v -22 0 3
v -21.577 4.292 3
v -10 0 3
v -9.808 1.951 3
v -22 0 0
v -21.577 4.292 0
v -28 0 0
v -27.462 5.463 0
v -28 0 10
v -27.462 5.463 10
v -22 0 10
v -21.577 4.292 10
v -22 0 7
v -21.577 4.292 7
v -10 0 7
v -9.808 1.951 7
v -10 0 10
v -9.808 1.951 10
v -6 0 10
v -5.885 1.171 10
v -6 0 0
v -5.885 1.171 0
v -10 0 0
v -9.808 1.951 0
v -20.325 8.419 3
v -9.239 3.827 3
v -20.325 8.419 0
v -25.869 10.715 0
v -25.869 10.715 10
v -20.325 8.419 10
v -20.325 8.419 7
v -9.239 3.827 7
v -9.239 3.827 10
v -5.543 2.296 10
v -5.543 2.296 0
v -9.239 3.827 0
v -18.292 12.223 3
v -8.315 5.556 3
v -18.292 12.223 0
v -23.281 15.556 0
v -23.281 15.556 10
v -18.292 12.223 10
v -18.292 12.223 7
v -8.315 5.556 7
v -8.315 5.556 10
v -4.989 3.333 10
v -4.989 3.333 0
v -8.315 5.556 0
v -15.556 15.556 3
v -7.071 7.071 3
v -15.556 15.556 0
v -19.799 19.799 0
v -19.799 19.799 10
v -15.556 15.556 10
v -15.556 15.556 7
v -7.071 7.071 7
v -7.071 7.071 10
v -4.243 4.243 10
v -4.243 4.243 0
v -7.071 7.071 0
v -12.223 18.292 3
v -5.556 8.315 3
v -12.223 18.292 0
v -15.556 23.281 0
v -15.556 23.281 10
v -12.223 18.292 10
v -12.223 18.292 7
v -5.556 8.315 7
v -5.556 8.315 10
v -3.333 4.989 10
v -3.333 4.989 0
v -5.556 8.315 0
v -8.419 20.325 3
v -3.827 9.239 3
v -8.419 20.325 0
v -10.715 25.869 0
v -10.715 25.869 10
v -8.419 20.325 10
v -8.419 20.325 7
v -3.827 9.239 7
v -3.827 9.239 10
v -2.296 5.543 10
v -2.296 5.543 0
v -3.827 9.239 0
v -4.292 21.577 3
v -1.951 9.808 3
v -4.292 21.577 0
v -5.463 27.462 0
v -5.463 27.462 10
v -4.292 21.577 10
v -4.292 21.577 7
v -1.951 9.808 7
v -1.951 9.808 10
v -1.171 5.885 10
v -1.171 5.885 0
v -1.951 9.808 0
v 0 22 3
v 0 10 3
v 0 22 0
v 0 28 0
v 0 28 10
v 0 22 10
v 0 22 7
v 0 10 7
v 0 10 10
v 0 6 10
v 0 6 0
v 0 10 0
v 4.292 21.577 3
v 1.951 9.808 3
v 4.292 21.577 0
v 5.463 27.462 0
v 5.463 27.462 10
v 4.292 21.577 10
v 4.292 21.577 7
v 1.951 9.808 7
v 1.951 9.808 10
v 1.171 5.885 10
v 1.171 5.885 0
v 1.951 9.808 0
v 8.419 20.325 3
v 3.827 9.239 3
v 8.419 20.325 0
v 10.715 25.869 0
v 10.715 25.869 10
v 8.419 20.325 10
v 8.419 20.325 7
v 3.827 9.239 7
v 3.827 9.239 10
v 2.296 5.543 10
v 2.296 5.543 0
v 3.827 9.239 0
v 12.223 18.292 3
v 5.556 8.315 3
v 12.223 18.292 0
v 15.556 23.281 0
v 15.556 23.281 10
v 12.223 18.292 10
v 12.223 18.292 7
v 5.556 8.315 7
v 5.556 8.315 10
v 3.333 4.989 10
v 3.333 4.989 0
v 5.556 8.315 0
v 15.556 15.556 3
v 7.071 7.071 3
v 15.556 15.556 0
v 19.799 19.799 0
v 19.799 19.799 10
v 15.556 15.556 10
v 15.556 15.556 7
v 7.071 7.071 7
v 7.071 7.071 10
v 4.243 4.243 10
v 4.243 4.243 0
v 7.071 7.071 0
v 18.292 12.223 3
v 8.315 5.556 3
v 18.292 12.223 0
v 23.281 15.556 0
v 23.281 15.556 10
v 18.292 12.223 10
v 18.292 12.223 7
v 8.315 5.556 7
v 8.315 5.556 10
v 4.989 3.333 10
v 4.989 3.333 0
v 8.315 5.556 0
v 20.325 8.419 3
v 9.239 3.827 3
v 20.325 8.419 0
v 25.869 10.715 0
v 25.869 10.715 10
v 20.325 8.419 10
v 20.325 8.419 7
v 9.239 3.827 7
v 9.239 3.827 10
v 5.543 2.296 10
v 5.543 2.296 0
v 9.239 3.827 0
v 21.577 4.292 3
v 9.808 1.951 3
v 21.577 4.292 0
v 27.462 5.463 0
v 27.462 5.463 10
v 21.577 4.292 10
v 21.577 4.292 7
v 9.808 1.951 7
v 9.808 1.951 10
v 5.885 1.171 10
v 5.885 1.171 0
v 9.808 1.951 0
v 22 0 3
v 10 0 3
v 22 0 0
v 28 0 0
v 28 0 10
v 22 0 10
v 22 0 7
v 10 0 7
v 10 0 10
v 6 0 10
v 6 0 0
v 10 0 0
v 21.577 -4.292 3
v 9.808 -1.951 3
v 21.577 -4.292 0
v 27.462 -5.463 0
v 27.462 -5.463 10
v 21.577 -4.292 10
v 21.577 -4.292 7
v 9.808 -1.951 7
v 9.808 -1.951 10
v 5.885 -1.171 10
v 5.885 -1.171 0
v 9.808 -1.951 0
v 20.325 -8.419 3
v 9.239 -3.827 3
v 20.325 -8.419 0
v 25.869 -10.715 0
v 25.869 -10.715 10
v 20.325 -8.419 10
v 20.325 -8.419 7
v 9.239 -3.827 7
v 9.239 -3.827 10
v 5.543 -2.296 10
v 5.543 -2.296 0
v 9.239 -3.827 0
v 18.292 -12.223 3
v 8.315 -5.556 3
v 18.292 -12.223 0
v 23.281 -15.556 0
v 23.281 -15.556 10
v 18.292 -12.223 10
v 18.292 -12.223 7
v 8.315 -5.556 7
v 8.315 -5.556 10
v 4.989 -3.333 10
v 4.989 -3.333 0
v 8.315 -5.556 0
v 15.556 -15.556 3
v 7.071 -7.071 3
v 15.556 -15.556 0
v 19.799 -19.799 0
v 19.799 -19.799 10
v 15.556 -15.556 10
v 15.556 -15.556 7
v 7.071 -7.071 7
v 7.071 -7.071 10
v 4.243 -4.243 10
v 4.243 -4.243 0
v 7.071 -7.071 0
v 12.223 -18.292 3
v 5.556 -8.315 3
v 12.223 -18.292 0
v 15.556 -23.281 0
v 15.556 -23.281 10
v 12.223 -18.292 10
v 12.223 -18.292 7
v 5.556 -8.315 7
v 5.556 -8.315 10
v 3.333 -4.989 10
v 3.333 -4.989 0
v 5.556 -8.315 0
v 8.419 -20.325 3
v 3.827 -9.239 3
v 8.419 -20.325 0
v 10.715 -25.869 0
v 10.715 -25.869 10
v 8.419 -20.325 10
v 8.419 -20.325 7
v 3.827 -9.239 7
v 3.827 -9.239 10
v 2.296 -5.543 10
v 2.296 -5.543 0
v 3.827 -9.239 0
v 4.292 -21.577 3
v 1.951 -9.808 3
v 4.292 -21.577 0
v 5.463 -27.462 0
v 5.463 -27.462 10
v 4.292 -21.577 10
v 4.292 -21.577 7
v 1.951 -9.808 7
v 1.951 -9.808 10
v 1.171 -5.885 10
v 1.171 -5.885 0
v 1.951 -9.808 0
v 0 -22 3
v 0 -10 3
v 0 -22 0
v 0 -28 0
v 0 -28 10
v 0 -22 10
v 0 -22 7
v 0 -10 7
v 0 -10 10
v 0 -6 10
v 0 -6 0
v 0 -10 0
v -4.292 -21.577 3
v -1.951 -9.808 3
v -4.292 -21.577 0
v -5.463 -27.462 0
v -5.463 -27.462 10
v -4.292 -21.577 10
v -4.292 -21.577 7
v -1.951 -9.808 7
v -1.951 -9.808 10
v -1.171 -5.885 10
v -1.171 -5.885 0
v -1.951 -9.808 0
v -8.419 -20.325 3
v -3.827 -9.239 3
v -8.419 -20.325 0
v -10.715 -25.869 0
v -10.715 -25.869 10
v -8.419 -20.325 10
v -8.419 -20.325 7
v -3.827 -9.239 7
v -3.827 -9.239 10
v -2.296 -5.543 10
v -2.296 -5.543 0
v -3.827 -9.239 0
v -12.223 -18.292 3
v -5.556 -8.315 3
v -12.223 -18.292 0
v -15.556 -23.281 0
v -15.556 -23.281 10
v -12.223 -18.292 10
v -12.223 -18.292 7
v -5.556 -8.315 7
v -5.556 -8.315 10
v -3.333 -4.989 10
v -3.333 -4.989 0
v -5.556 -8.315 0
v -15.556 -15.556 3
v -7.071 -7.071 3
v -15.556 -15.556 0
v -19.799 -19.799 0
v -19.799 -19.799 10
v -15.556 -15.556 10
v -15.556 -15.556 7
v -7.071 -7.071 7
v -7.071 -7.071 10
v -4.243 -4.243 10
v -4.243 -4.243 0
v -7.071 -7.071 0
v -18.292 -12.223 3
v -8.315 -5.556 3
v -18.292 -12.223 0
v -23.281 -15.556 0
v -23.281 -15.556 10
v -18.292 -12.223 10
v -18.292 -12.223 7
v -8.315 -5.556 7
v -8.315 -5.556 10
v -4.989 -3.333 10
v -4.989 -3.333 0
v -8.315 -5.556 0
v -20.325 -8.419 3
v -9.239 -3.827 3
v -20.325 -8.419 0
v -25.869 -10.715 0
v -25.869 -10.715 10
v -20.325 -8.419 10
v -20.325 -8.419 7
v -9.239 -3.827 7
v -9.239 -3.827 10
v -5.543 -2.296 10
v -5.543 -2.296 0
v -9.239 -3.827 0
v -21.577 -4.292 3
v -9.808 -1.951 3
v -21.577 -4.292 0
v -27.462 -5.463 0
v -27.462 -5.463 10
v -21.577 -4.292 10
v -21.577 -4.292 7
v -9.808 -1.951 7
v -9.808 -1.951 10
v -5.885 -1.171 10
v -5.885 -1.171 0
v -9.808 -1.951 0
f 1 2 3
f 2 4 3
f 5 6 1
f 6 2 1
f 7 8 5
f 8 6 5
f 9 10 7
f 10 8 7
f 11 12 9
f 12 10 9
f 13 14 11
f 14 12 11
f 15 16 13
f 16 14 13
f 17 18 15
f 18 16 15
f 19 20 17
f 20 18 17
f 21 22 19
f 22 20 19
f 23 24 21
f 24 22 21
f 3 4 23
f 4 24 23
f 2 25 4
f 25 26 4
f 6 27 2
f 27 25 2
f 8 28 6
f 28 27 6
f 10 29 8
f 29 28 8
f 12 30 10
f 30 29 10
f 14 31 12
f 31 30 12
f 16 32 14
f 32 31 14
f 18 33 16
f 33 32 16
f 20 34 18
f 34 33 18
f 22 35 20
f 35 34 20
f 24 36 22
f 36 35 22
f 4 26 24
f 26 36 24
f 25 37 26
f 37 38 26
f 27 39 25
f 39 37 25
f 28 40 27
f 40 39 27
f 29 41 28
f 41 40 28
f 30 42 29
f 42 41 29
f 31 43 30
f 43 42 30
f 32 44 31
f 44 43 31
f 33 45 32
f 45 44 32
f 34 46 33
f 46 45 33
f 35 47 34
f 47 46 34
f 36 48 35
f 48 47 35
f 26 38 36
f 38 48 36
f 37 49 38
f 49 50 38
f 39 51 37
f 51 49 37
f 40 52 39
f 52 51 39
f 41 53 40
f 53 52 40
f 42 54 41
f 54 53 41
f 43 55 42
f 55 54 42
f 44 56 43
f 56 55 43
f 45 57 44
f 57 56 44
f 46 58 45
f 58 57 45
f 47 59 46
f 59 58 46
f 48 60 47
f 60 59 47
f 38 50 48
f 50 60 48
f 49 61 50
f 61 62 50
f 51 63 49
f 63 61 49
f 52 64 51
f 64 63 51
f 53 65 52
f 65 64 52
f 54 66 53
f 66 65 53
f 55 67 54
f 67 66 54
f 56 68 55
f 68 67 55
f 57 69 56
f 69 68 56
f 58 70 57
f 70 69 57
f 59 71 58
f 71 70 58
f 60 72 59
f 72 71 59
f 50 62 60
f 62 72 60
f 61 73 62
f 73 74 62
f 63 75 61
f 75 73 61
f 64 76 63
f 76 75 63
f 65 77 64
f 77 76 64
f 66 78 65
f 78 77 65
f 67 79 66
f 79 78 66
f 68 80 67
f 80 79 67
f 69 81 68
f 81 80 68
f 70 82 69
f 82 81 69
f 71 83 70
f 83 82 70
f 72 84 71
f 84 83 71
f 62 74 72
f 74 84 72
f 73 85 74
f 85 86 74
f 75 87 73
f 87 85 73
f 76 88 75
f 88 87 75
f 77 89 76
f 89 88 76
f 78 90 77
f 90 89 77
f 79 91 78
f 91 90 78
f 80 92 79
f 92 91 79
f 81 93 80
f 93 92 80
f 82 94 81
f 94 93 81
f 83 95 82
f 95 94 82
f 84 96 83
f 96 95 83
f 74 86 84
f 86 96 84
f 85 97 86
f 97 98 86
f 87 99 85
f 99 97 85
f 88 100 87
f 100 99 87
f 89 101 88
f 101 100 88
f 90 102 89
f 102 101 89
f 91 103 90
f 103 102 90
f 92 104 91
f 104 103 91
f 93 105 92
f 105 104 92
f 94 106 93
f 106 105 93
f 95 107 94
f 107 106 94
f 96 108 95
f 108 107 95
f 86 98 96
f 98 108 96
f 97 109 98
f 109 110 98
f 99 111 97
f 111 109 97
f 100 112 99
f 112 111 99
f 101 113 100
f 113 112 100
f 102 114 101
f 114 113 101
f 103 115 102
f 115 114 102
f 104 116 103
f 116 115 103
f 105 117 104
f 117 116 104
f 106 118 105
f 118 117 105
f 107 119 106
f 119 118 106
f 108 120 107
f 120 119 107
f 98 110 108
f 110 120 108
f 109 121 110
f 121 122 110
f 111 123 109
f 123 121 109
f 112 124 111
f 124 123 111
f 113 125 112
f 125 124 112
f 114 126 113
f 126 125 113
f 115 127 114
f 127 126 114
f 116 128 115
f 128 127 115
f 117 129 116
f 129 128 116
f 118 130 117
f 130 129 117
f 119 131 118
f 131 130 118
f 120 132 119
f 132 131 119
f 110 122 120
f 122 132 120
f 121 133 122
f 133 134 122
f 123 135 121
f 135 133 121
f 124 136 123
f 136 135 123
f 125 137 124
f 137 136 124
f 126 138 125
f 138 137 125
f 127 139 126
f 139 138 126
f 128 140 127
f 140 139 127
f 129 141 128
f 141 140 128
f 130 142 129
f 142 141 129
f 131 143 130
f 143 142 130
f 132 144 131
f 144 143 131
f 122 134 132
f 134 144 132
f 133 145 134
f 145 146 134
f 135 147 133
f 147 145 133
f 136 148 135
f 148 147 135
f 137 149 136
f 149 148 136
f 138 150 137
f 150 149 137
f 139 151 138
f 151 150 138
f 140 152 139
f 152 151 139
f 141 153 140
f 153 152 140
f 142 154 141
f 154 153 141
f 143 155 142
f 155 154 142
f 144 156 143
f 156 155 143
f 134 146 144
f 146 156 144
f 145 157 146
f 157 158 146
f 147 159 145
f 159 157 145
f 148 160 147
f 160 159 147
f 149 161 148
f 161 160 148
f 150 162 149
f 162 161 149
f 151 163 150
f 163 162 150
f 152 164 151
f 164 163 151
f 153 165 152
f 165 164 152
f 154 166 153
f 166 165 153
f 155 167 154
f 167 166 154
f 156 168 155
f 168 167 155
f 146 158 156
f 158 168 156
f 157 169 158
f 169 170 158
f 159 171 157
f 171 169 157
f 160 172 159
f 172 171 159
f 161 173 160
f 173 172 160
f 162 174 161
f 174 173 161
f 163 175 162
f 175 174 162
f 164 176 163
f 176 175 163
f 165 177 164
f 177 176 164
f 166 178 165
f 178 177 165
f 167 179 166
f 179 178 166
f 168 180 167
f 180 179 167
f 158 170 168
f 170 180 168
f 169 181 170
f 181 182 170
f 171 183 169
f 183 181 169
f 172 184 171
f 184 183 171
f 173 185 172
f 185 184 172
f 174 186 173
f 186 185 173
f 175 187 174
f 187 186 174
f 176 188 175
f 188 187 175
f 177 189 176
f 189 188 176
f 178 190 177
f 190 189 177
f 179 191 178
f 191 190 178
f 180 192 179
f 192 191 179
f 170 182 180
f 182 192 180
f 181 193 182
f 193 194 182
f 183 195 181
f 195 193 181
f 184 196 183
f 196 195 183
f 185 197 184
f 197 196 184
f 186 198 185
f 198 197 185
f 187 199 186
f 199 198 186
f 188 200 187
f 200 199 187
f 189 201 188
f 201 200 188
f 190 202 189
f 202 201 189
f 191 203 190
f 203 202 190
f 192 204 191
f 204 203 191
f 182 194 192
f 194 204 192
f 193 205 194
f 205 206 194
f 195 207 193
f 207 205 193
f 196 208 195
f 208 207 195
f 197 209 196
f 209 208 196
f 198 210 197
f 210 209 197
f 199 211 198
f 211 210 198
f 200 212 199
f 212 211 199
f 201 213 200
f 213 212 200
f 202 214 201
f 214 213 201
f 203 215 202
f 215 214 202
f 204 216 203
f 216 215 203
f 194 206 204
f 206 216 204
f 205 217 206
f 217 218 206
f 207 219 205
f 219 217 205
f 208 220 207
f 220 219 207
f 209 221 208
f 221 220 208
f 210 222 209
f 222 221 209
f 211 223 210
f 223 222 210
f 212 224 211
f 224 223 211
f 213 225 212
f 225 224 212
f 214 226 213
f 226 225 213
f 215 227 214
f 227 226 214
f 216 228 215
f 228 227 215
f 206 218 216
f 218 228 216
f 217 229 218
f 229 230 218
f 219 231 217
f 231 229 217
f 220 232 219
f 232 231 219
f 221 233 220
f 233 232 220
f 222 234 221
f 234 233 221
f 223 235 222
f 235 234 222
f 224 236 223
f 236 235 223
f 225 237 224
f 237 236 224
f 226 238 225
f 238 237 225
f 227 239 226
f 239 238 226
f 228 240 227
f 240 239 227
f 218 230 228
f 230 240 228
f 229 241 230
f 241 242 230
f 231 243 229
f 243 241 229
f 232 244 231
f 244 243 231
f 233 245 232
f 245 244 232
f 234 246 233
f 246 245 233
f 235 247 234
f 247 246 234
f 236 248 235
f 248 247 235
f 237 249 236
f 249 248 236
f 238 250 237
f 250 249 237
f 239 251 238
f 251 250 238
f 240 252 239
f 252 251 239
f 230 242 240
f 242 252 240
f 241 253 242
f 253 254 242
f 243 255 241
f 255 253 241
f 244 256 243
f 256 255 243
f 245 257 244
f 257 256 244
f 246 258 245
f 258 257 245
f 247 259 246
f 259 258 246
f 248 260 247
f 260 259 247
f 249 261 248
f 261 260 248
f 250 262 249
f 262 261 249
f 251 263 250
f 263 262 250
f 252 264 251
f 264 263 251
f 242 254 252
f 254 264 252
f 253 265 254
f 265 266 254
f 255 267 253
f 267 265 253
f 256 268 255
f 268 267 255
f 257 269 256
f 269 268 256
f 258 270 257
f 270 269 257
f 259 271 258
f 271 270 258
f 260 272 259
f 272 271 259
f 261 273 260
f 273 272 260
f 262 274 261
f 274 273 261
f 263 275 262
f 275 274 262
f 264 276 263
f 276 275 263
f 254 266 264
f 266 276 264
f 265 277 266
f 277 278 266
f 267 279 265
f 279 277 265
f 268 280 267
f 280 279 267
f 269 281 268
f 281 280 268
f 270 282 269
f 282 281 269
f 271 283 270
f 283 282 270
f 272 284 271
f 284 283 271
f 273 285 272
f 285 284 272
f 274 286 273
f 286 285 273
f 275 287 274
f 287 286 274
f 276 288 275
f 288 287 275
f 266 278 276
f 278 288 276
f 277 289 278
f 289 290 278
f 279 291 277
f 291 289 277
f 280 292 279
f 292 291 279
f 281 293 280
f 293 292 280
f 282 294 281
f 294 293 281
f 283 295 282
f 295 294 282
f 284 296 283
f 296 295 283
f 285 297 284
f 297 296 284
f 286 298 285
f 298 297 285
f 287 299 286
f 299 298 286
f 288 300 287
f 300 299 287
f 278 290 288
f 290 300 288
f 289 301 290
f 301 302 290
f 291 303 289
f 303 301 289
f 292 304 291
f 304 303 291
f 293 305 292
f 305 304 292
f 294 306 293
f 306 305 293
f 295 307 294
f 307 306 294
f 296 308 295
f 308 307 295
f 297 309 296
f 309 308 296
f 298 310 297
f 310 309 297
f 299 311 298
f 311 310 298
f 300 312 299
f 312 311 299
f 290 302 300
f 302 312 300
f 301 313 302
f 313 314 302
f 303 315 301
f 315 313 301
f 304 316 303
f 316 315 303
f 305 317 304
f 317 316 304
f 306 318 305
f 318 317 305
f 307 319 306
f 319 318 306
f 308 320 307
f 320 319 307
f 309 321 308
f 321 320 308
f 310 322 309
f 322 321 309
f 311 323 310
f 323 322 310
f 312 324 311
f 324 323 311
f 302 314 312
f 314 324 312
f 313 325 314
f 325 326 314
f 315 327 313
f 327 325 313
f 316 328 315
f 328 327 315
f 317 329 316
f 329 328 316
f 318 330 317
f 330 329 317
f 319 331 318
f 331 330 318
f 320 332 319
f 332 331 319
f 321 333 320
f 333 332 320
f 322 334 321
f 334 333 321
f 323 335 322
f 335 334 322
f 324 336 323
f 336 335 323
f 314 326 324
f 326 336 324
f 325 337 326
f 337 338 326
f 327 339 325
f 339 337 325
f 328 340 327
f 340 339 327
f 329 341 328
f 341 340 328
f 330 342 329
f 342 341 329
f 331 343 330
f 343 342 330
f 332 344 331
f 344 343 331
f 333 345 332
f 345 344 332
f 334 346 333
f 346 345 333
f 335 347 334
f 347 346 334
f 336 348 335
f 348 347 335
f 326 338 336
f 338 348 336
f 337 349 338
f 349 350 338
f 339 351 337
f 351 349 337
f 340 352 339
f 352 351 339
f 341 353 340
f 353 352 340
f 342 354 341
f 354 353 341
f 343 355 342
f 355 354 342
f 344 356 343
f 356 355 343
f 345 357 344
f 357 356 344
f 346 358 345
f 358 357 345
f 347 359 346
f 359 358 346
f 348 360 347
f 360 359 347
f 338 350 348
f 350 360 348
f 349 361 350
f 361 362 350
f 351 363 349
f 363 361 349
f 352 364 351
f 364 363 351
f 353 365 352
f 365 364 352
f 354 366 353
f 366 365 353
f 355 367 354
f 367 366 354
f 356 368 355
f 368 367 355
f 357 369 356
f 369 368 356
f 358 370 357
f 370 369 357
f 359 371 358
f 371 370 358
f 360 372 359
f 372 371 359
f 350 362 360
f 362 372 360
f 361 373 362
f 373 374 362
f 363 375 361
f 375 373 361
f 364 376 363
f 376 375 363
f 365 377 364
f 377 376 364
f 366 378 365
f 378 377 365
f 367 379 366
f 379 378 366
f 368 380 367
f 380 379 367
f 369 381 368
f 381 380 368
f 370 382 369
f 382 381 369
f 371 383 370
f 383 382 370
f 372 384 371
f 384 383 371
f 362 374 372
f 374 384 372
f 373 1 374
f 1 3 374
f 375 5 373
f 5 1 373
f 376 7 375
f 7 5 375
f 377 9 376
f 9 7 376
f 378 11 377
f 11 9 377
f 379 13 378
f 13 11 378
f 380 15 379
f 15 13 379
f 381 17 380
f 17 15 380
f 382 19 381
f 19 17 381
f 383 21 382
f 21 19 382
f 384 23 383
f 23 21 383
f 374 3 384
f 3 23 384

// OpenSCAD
$fn = 32;

// ----------------------------------------------------------------------
// Revolved part: handwheel R28
// ----------------------------------------------------------------------

// --- parameters (mm) ---
bore_r = 6;               // bore radius
rim_r = 28;               // rim radius
rim_w = 6;                // rim axial width
rim_t = 10;               // rim diameter height
hub_r = 10;               // hub radius
web_t = 4;                // web thickness
revolve_angle = 360;      // revolve sweep, degrees

bore_d = 2 * bore_r;
rim_d = 2 * rim_r;
hub_d = 2 * hub_r;

profile = [[6, 0], [10, 0], [10, 3], [22, 3], [22, 0], [28, 0], [28, 10], [22, 10], [22, 7], [10, 7], [10, 10], [6, 10]];  // primary outline, 12 points, counter clockwise

// --- the one profile operation ---
rotate_extrude(angle = revolve_angle) polygon(points = profile);
